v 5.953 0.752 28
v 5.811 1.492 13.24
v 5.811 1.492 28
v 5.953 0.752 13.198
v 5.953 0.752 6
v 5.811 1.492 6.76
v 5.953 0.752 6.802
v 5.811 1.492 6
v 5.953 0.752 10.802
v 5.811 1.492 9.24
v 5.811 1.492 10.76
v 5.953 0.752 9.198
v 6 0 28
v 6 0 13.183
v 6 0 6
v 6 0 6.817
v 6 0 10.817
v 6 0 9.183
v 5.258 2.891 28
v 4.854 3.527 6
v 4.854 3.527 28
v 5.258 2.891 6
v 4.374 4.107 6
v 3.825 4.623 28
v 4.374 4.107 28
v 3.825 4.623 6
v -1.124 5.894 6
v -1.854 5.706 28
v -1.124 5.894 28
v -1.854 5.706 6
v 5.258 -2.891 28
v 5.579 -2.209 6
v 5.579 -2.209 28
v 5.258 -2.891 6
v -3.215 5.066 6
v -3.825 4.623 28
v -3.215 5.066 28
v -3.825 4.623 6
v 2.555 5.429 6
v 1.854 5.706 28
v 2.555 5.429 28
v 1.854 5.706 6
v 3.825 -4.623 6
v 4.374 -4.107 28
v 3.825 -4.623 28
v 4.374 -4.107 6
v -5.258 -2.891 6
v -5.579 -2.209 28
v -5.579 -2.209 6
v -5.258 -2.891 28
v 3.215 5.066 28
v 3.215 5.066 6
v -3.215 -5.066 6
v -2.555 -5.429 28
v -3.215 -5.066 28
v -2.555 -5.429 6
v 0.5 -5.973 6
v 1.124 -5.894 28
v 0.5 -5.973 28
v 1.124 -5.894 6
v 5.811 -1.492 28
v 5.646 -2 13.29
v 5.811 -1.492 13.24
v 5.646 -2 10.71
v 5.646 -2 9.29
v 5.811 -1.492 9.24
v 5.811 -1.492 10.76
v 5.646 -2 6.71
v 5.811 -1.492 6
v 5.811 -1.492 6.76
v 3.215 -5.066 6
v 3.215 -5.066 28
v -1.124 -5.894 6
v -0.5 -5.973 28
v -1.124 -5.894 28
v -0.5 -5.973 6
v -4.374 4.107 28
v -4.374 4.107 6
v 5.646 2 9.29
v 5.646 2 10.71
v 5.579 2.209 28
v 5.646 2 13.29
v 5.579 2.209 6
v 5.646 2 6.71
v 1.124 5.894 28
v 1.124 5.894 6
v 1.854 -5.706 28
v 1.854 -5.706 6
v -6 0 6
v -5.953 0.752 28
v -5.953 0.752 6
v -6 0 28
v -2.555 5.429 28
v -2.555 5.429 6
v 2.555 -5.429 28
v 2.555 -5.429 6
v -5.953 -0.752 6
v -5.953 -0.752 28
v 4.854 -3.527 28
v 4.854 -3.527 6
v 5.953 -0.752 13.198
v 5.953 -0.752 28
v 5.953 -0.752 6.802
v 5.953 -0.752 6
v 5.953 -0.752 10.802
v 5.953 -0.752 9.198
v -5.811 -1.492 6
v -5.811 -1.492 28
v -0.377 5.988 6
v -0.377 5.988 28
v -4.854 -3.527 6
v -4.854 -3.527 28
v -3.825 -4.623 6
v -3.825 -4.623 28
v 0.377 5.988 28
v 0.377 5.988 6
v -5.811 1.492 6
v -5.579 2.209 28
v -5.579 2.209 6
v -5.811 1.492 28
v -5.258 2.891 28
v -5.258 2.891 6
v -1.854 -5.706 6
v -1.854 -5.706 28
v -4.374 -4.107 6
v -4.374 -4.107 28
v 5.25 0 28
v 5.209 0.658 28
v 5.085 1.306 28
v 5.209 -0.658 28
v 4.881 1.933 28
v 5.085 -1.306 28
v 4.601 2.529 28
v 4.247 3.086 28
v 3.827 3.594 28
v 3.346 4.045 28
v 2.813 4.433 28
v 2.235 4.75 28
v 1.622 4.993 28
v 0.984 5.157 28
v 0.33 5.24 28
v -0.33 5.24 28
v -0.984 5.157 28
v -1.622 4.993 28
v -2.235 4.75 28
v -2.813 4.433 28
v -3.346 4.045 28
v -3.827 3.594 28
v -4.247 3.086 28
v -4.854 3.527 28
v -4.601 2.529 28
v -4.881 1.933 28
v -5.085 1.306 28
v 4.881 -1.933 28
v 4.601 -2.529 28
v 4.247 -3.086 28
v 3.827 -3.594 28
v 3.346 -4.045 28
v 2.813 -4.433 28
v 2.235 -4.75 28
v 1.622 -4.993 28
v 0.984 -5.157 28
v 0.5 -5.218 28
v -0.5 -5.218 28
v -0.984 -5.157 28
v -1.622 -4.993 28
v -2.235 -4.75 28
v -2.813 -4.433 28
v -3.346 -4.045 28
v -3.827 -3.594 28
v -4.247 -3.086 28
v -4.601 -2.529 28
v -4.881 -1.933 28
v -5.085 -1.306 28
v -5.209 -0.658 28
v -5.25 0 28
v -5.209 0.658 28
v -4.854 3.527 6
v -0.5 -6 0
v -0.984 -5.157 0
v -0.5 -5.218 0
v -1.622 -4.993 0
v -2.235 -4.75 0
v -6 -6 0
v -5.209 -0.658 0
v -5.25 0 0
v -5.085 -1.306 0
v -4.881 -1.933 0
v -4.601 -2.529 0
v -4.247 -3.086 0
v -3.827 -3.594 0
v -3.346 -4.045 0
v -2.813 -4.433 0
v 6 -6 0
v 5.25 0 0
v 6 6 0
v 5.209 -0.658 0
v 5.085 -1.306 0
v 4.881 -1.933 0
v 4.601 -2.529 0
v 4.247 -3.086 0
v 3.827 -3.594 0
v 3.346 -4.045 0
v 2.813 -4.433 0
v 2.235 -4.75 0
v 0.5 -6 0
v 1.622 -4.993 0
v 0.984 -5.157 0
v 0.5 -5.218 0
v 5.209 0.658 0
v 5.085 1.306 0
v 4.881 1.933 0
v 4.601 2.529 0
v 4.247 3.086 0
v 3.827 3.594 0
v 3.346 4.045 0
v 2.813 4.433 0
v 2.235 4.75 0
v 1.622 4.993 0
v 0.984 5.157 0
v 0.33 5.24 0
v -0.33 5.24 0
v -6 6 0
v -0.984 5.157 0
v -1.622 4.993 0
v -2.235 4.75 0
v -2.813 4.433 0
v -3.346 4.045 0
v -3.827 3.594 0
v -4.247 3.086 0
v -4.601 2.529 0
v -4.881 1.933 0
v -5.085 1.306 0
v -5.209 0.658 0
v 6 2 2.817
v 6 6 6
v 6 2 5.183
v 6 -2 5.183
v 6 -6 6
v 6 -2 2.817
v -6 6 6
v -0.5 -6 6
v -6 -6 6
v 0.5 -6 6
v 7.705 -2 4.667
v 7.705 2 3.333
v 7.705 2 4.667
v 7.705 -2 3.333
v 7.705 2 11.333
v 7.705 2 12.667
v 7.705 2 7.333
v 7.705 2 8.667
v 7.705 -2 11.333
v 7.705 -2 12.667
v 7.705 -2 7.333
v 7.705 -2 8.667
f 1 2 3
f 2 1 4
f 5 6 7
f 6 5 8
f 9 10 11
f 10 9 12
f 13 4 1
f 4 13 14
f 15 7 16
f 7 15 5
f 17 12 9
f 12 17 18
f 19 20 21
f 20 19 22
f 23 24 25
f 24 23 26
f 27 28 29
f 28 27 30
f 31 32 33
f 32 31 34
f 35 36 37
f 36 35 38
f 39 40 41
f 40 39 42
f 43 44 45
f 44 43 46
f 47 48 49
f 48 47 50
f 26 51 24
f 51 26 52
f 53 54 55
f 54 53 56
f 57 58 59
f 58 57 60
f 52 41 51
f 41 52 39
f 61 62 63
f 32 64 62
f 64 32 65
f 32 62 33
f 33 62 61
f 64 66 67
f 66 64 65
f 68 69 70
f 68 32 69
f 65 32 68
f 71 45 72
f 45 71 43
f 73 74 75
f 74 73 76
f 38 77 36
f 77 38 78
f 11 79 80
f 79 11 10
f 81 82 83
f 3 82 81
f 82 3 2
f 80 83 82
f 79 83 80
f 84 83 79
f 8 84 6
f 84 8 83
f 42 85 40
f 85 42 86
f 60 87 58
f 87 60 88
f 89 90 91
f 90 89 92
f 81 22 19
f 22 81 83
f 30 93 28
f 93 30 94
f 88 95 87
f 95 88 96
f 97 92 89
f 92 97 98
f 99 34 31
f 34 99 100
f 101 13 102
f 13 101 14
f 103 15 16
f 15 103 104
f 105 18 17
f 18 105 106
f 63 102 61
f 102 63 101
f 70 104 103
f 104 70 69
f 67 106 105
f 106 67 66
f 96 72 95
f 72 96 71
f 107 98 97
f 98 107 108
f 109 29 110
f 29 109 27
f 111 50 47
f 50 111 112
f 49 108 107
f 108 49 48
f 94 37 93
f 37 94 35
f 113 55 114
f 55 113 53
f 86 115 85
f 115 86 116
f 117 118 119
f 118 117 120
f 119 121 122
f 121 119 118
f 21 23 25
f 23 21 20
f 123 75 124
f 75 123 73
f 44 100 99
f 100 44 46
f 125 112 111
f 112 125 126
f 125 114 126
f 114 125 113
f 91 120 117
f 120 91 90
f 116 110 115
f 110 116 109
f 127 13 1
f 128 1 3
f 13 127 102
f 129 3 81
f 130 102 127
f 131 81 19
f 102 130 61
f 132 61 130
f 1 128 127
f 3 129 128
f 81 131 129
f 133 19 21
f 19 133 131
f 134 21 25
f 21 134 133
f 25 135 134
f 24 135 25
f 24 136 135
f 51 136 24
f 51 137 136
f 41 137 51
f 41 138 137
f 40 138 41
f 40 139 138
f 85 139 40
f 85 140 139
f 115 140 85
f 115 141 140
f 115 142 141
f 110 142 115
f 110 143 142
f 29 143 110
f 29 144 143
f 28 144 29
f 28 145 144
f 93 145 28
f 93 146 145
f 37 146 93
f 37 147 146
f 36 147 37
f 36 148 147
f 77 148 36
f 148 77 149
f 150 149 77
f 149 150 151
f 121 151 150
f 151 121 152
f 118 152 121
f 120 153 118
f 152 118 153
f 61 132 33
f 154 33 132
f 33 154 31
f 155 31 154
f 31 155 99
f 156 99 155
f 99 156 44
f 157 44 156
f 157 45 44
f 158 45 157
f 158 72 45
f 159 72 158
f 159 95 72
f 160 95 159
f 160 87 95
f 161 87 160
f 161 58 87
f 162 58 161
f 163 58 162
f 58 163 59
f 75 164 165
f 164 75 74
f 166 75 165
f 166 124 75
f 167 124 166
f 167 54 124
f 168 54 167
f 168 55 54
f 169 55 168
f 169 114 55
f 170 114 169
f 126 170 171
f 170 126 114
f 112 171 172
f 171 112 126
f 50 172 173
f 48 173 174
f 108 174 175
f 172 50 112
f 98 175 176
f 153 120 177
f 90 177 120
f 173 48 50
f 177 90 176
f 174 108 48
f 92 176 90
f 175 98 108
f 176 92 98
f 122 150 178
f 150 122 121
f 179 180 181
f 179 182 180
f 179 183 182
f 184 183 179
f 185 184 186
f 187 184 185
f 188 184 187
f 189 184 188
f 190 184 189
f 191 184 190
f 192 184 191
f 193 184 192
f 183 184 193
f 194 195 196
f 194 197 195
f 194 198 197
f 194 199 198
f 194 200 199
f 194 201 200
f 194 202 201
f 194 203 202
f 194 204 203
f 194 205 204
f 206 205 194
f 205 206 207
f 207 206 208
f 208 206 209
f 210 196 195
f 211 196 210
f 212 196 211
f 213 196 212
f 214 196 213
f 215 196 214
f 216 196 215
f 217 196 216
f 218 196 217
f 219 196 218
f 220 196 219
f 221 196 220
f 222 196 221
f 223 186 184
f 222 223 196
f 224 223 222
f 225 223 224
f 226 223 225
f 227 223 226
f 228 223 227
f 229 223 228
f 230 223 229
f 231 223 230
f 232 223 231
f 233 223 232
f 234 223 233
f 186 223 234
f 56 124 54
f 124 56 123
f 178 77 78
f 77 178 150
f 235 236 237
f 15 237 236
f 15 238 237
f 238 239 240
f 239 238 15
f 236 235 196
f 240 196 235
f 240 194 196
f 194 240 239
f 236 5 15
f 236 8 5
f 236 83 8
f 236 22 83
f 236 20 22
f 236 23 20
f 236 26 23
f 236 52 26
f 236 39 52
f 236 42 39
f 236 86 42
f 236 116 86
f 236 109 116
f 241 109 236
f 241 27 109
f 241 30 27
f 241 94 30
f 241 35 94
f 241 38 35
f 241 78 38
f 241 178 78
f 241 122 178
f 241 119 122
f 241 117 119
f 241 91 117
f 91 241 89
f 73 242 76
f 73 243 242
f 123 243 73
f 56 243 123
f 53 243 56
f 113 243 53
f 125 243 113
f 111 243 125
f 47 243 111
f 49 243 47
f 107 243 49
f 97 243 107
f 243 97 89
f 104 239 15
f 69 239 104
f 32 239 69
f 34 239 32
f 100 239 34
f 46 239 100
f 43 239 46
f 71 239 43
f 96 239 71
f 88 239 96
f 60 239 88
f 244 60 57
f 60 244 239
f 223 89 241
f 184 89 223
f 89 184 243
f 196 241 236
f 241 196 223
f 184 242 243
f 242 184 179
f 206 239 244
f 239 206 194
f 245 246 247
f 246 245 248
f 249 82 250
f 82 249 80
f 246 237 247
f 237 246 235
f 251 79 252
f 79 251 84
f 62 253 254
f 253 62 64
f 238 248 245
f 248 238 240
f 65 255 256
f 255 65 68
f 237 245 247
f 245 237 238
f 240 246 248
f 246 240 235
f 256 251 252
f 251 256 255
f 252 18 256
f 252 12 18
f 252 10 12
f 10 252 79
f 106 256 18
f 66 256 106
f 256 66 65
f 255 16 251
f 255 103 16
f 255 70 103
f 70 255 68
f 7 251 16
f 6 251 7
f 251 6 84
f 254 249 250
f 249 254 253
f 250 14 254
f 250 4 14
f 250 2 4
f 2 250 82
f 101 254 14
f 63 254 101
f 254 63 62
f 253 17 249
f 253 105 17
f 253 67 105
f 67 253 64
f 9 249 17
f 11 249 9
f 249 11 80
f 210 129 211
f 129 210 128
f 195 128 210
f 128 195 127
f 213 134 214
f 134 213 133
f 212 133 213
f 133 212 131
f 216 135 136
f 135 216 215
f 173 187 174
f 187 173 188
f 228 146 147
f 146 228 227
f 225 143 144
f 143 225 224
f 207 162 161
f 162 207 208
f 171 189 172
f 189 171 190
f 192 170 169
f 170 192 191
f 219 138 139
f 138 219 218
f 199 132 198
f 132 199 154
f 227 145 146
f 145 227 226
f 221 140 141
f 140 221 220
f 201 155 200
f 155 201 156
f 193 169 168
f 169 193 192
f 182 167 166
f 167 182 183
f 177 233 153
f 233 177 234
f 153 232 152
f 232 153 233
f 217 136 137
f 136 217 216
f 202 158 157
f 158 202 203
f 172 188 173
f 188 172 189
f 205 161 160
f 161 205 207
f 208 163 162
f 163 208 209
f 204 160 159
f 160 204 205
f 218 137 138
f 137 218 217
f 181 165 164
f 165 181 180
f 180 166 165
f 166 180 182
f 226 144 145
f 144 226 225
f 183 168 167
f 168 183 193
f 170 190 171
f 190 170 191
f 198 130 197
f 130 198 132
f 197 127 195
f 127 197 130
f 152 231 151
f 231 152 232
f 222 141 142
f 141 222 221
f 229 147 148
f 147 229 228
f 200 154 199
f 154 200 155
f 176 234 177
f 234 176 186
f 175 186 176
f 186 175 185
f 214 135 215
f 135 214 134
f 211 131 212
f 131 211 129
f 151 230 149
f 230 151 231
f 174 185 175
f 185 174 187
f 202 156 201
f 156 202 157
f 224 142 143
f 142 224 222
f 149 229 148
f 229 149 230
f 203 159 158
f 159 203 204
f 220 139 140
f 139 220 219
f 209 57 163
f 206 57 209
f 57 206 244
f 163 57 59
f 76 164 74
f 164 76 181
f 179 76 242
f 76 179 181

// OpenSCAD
/*
  =============================================================================
  05_Modulo_Z_Caneta.scad - Êmbolo Móvel Z da Caneta (GEOMETRIA CORRIGIDA)
  =============================================================================
  Correções:
    - Cremalheira Z usa rack_z() canônico com base sólida de 0.6mm
    - Rasgo de clamp flexível cortado apenas na parede frontal (Y <= 0)
      mantendo a parede traseira intacta (1 ÚNICO COMPONENTE CONECTADO)
    - Cavidade da mola de compliance preservada
  
  Orientação de impressão: base do êmbolo no leito (Z=0).
  =============================================================================
*/

include <00_Parametros.scad>;

module modulo_z_pen_plunger() {
  // Corpo do êmbolo
  plunger_w = 12.0;  // X
  plunger_d = 12.0;  // Y
  plunger_h = active_z_travel + compliance_travel + spring_length + 5.0;  // ≈28mm

  // Cavidade para a mola de compliance
  spring_r = spring_outer_diameter / 2 + 0.3;
  spring_z_start = 3.0;

  // Clamp da caneta
  pen_r = pen_diameter / 2 + pen_clearance;

  // Cremalheira Z integrada: dentes projetam em +X, espaçados ao longo de Z
  rack_z_height = active_z_travel + 6.0;  // comprimento útil do rack
  rack_z_width  = 4.0;

  difference() {
    union() {
      color([0.40, 0.48, 0.55]) {
        // Corpo cilíndrico principal
        cylinder(r=plunger_w/2, h=plunger_h);

        // Reforço quadrado na base para estabilidade
        translate([-plunger_w/2, -plunger_d/2, 0])
          cube([plunger_w, plunger_d, 6.0]);
      }

      // ====== CREMALHEIRA Z INTEGRADA ======
      // Base de 0.6mm afundada em 0.5mm dentro da parede lateral (+X)
      color([0.95, 0.85, 0.15])
        translate([plunger_w/2 - 0.5, 0, 2.0])
          rack_z(length=rack_z_height, width=rack_z_width);
    }

    // ====== FURO DA CANETA (passante, vertical) ======
    translate([0, 0, -EPS])
      cylinder(r=pen_r, h=plunger_h + EPS*2);

    // ====== CAVIDADE DA MOLA DE COMPLIANCE ======
    translate([0, 0, spring_z_start])
      cylinder(r=spring_r, h=spring_length + 2.0);

    // ====== RASGO DE CLAMP FLEXÍVEL (corta apenas a parede frontal Y <= 0) ======
    translate([-0.5, -plunger_d/2 - EPS, -EPS])
      cube([1.0, plunger_d/2 + EPS, plunger_h + EPS*2]);
  }
}

// Renderização para impressão/exportação
modulo_z_pen_plunger();
